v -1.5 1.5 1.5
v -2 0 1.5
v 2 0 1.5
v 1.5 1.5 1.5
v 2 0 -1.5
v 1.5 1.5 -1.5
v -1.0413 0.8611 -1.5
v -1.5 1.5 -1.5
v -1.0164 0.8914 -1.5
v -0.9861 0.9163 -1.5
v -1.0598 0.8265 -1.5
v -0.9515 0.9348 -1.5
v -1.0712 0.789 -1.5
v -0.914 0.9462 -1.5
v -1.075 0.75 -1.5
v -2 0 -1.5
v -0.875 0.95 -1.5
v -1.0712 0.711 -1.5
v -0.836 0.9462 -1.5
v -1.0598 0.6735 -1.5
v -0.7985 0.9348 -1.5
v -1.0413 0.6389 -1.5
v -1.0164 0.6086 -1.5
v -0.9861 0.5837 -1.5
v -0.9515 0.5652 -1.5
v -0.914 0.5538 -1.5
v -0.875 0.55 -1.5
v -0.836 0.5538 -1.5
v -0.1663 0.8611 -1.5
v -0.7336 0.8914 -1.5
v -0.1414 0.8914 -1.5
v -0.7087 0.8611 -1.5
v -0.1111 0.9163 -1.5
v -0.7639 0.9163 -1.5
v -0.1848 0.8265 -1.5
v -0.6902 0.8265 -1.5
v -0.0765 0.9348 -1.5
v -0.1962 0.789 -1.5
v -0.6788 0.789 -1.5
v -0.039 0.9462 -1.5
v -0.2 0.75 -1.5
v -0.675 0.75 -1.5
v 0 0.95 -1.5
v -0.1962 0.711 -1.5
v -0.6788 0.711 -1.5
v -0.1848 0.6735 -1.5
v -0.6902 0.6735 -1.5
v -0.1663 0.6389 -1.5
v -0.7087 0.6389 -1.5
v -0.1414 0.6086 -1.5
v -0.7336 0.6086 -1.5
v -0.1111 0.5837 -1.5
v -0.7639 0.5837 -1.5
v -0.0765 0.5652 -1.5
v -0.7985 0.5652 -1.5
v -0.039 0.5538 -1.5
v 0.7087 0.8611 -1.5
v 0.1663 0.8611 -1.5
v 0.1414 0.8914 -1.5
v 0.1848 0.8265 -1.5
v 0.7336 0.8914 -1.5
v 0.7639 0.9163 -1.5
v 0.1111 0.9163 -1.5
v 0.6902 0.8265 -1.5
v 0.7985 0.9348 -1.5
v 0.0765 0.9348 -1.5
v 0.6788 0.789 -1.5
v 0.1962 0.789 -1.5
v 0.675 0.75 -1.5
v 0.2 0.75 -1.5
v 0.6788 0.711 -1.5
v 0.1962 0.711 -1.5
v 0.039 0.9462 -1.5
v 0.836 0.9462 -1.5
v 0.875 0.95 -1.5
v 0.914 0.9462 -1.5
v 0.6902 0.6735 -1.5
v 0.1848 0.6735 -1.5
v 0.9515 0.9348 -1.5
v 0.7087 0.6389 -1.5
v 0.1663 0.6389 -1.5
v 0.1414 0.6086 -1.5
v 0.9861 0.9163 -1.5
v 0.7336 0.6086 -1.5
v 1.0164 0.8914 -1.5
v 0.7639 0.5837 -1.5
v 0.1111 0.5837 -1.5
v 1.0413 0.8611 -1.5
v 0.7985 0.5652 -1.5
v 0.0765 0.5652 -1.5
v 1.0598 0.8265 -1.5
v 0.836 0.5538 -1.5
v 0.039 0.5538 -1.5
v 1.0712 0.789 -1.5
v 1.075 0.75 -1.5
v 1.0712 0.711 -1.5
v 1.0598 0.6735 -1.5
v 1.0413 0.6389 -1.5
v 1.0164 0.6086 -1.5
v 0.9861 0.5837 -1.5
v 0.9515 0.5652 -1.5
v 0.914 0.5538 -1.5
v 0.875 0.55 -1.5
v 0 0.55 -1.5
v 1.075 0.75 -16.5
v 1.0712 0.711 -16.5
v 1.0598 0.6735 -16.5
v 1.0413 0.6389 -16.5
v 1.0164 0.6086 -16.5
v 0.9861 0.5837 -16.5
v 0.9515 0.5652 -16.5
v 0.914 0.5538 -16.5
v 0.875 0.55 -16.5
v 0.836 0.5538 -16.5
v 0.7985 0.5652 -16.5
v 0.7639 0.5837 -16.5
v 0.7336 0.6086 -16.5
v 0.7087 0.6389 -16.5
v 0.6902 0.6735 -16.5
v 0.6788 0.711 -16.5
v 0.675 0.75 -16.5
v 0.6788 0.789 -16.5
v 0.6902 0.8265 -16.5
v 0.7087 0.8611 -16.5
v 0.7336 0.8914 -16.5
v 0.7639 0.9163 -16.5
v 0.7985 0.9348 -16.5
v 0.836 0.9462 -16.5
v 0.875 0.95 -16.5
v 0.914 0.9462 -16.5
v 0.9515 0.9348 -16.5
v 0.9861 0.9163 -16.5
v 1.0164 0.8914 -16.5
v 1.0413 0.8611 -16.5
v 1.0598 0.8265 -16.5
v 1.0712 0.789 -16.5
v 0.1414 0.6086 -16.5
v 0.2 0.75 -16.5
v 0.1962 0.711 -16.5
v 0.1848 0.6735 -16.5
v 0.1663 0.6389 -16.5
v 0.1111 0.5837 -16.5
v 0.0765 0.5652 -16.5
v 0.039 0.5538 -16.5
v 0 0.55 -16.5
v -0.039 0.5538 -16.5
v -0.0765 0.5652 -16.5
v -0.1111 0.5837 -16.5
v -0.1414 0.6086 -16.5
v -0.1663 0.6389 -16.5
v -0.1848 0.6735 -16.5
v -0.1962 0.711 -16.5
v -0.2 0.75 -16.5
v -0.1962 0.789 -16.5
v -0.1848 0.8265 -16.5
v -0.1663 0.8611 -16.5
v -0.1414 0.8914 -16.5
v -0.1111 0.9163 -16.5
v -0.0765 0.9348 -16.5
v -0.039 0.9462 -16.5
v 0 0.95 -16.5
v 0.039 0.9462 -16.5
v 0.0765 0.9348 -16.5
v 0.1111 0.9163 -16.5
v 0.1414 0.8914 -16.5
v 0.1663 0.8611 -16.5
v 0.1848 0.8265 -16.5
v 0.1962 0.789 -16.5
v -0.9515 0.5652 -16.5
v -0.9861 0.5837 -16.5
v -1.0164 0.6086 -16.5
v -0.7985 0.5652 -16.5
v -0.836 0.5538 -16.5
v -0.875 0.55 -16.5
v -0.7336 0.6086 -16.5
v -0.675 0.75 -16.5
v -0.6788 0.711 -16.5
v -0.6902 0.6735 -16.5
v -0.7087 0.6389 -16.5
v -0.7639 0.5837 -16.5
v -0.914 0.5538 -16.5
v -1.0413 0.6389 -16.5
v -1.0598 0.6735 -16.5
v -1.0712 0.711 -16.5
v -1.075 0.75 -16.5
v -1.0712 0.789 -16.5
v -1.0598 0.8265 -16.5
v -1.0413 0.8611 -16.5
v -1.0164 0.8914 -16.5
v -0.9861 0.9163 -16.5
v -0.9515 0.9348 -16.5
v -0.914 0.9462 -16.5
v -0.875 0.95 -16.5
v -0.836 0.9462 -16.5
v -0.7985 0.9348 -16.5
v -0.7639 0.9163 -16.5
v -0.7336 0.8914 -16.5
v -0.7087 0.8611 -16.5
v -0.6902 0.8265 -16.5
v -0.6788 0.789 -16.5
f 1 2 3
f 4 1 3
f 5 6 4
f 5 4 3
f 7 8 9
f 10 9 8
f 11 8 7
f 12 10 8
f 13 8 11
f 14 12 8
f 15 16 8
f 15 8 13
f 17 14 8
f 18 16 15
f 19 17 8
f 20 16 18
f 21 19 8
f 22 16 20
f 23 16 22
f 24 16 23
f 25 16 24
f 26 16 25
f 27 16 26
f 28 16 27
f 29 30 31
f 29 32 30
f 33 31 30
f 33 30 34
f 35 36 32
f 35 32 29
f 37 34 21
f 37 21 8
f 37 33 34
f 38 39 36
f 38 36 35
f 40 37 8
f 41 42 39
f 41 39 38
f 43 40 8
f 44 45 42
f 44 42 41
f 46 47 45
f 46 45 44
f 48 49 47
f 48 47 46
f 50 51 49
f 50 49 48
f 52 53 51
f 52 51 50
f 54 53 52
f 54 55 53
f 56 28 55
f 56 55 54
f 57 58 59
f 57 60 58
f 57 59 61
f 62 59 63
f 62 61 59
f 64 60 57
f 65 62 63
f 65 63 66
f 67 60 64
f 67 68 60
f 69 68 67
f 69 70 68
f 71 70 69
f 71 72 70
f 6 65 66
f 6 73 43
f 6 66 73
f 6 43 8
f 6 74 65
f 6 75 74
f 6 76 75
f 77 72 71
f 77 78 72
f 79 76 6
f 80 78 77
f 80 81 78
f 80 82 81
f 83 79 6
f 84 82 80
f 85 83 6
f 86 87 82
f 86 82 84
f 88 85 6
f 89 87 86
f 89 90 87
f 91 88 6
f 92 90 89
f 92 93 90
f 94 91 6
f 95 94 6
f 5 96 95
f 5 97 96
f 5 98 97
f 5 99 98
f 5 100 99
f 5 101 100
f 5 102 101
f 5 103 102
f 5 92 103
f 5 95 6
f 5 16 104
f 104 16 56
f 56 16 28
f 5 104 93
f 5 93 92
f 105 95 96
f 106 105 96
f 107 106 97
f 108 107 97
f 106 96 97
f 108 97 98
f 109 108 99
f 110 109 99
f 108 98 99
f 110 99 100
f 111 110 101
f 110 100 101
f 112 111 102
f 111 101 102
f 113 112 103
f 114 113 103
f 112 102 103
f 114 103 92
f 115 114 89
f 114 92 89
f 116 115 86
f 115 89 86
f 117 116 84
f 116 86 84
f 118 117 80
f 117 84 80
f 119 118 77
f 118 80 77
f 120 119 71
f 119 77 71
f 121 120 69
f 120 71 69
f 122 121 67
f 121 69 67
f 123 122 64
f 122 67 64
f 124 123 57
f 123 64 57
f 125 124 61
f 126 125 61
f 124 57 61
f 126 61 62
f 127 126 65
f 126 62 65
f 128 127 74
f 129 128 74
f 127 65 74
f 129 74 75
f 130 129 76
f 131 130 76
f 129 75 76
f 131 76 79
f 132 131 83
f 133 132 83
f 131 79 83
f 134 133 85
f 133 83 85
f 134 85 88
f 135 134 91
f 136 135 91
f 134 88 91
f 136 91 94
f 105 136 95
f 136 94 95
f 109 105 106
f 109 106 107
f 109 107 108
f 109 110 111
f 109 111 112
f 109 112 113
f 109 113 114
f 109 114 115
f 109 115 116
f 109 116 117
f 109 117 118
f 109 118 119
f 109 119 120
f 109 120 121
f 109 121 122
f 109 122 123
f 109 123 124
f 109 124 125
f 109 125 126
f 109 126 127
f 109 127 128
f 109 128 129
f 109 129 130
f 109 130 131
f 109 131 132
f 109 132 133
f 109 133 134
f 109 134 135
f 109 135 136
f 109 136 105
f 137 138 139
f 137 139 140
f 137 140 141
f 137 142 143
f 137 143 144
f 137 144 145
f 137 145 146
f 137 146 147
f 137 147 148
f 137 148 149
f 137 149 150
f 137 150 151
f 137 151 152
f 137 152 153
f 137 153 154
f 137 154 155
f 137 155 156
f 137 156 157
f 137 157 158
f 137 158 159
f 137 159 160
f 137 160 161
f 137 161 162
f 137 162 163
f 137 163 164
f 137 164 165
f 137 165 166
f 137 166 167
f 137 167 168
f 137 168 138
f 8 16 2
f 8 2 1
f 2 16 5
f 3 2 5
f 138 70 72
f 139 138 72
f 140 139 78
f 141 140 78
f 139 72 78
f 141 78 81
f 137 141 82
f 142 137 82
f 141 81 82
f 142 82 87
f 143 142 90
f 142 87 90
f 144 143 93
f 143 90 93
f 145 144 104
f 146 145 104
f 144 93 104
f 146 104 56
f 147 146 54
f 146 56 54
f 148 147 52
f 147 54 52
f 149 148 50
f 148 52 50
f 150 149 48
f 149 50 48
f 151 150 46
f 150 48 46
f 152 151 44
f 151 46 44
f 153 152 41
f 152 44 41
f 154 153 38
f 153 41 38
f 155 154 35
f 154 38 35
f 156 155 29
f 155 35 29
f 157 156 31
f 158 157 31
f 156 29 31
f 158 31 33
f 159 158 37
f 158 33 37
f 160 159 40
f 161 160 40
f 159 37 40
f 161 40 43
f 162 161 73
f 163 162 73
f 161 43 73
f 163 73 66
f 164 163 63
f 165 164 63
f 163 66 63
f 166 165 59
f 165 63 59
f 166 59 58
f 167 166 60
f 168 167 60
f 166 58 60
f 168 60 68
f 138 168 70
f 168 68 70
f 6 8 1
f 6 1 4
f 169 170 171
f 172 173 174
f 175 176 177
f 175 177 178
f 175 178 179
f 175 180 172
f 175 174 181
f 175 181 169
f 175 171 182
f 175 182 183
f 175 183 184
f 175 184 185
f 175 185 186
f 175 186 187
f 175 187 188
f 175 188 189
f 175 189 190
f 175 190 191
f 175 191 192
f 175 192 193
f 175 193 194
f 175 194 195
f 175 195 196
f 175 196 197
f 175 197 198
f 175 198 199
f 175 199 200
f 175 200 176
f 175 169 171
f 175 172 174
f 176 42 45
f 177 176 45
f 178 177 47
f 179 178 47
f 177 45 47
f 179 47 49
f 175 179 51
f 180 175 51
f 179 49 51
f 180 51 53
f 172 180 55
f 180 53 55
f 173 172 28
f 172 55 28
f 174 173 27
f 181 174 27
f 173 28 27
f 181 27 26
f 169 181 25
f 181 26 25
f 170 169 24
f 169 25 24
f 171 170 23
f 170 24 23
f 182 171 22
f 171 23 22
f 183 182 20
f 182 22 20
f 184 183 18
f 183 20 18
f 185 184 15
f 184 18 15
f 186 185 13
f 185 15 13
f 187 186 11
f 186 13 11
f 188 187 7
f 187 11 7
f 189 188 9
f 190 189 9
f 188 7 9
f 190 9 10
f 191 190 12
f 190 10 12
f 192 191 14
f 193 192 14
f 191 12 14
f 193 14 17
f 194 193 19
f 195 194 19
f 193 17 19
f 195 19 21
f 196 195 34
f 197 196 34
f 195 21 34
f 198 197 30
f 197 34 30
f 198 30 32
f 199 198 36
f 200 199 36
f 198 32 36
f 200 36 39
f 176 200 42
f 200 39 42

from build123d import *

# Parameters (mm, degrees)
SKETCH1_W           = 4
SKETCH1_H           = 3
BOSS_EXTRUDE1_DEPTH = 1.5
SPLIT1_START        = -1.5
SPLIT1_DEPTH        = 3
SPLIT1_2_DEPTH      = 3
SPLIT1_3_DEPTH      = 3
SKETCH5_R           = 0.2
BOSS_EXTRUDE2_DEPTH = 15


# Read off the part's stored shape, not the designer's step: Split1
with BuildPart() as part:
    # Sketch1 → Boss-Extrude1 (new body)
    with BuildSketch(Plane(origin=(0, 0, 0), x_dir=(1, 0, 0), z_dir=(0, 1, 0))):
        Rectangle(SKETCH1_W, SKETCH1_H)
    extrude(amount=BOSS_EXTRUDE1_DEPTH)

    # Split1 outline → Split1 (cut)
    with BuildSketch(Plane.XY.offset(SPLIT1_START)):
        Polygon((-2, 1.5), (-2, 0), (-1.5, 1.5), align=None)
        Polygon((2, 1.5), (1.5, 1.5), (2, 0), align=None)
    extrude(amount=SPLIT1_DEPTH, mode=Mode.SUBTRACT)

    # Sketch5 → Boss-Extrude2 (add)
    with BuildSketch(Plane(origin=(0, 0, -1.5), x_dir=(-1, 0, 0), z_dir=(0, 0, -1))):
        with Locations(Location((0, 0.75, 0), (0, 0, 180))):
            Circle(SKETCH5_R)
        with Locations(Location((-0.875, 0.75, 0), (0, 0, 180))):
            Circle(SKETCH5_R)
        with Locations(Location((0.875, 0.75, 0), (0, 0, 180))):
            Circle(SKETCH5_R)
    extrude(amount=BOSS_EXTRUDE2_DEPTH)


with BuildPart() as body_2:
    # Split1 2 outline → Split1 2 (new body)
    with BuildSketch(Plane.XY.offset(SPLIT1_START)):
        Polygon((-2, 1.5), (-2, 0), (-1.5, 1.5), align=None)
    extrude(amount=SPLIT1_2_DEPTH)


with BuildPart() as body_3:
    # Split1 3 outline → Split1 3 (new body)
    with BuildSketch(Plane.XY.offset(SPLIT1_START)):
        Polygon((2, 1.5), (1.5, 1.5), (2, 0), align=None)
    extrude(amount=SPLIT1_3_DEPTH)


solid = part.part
